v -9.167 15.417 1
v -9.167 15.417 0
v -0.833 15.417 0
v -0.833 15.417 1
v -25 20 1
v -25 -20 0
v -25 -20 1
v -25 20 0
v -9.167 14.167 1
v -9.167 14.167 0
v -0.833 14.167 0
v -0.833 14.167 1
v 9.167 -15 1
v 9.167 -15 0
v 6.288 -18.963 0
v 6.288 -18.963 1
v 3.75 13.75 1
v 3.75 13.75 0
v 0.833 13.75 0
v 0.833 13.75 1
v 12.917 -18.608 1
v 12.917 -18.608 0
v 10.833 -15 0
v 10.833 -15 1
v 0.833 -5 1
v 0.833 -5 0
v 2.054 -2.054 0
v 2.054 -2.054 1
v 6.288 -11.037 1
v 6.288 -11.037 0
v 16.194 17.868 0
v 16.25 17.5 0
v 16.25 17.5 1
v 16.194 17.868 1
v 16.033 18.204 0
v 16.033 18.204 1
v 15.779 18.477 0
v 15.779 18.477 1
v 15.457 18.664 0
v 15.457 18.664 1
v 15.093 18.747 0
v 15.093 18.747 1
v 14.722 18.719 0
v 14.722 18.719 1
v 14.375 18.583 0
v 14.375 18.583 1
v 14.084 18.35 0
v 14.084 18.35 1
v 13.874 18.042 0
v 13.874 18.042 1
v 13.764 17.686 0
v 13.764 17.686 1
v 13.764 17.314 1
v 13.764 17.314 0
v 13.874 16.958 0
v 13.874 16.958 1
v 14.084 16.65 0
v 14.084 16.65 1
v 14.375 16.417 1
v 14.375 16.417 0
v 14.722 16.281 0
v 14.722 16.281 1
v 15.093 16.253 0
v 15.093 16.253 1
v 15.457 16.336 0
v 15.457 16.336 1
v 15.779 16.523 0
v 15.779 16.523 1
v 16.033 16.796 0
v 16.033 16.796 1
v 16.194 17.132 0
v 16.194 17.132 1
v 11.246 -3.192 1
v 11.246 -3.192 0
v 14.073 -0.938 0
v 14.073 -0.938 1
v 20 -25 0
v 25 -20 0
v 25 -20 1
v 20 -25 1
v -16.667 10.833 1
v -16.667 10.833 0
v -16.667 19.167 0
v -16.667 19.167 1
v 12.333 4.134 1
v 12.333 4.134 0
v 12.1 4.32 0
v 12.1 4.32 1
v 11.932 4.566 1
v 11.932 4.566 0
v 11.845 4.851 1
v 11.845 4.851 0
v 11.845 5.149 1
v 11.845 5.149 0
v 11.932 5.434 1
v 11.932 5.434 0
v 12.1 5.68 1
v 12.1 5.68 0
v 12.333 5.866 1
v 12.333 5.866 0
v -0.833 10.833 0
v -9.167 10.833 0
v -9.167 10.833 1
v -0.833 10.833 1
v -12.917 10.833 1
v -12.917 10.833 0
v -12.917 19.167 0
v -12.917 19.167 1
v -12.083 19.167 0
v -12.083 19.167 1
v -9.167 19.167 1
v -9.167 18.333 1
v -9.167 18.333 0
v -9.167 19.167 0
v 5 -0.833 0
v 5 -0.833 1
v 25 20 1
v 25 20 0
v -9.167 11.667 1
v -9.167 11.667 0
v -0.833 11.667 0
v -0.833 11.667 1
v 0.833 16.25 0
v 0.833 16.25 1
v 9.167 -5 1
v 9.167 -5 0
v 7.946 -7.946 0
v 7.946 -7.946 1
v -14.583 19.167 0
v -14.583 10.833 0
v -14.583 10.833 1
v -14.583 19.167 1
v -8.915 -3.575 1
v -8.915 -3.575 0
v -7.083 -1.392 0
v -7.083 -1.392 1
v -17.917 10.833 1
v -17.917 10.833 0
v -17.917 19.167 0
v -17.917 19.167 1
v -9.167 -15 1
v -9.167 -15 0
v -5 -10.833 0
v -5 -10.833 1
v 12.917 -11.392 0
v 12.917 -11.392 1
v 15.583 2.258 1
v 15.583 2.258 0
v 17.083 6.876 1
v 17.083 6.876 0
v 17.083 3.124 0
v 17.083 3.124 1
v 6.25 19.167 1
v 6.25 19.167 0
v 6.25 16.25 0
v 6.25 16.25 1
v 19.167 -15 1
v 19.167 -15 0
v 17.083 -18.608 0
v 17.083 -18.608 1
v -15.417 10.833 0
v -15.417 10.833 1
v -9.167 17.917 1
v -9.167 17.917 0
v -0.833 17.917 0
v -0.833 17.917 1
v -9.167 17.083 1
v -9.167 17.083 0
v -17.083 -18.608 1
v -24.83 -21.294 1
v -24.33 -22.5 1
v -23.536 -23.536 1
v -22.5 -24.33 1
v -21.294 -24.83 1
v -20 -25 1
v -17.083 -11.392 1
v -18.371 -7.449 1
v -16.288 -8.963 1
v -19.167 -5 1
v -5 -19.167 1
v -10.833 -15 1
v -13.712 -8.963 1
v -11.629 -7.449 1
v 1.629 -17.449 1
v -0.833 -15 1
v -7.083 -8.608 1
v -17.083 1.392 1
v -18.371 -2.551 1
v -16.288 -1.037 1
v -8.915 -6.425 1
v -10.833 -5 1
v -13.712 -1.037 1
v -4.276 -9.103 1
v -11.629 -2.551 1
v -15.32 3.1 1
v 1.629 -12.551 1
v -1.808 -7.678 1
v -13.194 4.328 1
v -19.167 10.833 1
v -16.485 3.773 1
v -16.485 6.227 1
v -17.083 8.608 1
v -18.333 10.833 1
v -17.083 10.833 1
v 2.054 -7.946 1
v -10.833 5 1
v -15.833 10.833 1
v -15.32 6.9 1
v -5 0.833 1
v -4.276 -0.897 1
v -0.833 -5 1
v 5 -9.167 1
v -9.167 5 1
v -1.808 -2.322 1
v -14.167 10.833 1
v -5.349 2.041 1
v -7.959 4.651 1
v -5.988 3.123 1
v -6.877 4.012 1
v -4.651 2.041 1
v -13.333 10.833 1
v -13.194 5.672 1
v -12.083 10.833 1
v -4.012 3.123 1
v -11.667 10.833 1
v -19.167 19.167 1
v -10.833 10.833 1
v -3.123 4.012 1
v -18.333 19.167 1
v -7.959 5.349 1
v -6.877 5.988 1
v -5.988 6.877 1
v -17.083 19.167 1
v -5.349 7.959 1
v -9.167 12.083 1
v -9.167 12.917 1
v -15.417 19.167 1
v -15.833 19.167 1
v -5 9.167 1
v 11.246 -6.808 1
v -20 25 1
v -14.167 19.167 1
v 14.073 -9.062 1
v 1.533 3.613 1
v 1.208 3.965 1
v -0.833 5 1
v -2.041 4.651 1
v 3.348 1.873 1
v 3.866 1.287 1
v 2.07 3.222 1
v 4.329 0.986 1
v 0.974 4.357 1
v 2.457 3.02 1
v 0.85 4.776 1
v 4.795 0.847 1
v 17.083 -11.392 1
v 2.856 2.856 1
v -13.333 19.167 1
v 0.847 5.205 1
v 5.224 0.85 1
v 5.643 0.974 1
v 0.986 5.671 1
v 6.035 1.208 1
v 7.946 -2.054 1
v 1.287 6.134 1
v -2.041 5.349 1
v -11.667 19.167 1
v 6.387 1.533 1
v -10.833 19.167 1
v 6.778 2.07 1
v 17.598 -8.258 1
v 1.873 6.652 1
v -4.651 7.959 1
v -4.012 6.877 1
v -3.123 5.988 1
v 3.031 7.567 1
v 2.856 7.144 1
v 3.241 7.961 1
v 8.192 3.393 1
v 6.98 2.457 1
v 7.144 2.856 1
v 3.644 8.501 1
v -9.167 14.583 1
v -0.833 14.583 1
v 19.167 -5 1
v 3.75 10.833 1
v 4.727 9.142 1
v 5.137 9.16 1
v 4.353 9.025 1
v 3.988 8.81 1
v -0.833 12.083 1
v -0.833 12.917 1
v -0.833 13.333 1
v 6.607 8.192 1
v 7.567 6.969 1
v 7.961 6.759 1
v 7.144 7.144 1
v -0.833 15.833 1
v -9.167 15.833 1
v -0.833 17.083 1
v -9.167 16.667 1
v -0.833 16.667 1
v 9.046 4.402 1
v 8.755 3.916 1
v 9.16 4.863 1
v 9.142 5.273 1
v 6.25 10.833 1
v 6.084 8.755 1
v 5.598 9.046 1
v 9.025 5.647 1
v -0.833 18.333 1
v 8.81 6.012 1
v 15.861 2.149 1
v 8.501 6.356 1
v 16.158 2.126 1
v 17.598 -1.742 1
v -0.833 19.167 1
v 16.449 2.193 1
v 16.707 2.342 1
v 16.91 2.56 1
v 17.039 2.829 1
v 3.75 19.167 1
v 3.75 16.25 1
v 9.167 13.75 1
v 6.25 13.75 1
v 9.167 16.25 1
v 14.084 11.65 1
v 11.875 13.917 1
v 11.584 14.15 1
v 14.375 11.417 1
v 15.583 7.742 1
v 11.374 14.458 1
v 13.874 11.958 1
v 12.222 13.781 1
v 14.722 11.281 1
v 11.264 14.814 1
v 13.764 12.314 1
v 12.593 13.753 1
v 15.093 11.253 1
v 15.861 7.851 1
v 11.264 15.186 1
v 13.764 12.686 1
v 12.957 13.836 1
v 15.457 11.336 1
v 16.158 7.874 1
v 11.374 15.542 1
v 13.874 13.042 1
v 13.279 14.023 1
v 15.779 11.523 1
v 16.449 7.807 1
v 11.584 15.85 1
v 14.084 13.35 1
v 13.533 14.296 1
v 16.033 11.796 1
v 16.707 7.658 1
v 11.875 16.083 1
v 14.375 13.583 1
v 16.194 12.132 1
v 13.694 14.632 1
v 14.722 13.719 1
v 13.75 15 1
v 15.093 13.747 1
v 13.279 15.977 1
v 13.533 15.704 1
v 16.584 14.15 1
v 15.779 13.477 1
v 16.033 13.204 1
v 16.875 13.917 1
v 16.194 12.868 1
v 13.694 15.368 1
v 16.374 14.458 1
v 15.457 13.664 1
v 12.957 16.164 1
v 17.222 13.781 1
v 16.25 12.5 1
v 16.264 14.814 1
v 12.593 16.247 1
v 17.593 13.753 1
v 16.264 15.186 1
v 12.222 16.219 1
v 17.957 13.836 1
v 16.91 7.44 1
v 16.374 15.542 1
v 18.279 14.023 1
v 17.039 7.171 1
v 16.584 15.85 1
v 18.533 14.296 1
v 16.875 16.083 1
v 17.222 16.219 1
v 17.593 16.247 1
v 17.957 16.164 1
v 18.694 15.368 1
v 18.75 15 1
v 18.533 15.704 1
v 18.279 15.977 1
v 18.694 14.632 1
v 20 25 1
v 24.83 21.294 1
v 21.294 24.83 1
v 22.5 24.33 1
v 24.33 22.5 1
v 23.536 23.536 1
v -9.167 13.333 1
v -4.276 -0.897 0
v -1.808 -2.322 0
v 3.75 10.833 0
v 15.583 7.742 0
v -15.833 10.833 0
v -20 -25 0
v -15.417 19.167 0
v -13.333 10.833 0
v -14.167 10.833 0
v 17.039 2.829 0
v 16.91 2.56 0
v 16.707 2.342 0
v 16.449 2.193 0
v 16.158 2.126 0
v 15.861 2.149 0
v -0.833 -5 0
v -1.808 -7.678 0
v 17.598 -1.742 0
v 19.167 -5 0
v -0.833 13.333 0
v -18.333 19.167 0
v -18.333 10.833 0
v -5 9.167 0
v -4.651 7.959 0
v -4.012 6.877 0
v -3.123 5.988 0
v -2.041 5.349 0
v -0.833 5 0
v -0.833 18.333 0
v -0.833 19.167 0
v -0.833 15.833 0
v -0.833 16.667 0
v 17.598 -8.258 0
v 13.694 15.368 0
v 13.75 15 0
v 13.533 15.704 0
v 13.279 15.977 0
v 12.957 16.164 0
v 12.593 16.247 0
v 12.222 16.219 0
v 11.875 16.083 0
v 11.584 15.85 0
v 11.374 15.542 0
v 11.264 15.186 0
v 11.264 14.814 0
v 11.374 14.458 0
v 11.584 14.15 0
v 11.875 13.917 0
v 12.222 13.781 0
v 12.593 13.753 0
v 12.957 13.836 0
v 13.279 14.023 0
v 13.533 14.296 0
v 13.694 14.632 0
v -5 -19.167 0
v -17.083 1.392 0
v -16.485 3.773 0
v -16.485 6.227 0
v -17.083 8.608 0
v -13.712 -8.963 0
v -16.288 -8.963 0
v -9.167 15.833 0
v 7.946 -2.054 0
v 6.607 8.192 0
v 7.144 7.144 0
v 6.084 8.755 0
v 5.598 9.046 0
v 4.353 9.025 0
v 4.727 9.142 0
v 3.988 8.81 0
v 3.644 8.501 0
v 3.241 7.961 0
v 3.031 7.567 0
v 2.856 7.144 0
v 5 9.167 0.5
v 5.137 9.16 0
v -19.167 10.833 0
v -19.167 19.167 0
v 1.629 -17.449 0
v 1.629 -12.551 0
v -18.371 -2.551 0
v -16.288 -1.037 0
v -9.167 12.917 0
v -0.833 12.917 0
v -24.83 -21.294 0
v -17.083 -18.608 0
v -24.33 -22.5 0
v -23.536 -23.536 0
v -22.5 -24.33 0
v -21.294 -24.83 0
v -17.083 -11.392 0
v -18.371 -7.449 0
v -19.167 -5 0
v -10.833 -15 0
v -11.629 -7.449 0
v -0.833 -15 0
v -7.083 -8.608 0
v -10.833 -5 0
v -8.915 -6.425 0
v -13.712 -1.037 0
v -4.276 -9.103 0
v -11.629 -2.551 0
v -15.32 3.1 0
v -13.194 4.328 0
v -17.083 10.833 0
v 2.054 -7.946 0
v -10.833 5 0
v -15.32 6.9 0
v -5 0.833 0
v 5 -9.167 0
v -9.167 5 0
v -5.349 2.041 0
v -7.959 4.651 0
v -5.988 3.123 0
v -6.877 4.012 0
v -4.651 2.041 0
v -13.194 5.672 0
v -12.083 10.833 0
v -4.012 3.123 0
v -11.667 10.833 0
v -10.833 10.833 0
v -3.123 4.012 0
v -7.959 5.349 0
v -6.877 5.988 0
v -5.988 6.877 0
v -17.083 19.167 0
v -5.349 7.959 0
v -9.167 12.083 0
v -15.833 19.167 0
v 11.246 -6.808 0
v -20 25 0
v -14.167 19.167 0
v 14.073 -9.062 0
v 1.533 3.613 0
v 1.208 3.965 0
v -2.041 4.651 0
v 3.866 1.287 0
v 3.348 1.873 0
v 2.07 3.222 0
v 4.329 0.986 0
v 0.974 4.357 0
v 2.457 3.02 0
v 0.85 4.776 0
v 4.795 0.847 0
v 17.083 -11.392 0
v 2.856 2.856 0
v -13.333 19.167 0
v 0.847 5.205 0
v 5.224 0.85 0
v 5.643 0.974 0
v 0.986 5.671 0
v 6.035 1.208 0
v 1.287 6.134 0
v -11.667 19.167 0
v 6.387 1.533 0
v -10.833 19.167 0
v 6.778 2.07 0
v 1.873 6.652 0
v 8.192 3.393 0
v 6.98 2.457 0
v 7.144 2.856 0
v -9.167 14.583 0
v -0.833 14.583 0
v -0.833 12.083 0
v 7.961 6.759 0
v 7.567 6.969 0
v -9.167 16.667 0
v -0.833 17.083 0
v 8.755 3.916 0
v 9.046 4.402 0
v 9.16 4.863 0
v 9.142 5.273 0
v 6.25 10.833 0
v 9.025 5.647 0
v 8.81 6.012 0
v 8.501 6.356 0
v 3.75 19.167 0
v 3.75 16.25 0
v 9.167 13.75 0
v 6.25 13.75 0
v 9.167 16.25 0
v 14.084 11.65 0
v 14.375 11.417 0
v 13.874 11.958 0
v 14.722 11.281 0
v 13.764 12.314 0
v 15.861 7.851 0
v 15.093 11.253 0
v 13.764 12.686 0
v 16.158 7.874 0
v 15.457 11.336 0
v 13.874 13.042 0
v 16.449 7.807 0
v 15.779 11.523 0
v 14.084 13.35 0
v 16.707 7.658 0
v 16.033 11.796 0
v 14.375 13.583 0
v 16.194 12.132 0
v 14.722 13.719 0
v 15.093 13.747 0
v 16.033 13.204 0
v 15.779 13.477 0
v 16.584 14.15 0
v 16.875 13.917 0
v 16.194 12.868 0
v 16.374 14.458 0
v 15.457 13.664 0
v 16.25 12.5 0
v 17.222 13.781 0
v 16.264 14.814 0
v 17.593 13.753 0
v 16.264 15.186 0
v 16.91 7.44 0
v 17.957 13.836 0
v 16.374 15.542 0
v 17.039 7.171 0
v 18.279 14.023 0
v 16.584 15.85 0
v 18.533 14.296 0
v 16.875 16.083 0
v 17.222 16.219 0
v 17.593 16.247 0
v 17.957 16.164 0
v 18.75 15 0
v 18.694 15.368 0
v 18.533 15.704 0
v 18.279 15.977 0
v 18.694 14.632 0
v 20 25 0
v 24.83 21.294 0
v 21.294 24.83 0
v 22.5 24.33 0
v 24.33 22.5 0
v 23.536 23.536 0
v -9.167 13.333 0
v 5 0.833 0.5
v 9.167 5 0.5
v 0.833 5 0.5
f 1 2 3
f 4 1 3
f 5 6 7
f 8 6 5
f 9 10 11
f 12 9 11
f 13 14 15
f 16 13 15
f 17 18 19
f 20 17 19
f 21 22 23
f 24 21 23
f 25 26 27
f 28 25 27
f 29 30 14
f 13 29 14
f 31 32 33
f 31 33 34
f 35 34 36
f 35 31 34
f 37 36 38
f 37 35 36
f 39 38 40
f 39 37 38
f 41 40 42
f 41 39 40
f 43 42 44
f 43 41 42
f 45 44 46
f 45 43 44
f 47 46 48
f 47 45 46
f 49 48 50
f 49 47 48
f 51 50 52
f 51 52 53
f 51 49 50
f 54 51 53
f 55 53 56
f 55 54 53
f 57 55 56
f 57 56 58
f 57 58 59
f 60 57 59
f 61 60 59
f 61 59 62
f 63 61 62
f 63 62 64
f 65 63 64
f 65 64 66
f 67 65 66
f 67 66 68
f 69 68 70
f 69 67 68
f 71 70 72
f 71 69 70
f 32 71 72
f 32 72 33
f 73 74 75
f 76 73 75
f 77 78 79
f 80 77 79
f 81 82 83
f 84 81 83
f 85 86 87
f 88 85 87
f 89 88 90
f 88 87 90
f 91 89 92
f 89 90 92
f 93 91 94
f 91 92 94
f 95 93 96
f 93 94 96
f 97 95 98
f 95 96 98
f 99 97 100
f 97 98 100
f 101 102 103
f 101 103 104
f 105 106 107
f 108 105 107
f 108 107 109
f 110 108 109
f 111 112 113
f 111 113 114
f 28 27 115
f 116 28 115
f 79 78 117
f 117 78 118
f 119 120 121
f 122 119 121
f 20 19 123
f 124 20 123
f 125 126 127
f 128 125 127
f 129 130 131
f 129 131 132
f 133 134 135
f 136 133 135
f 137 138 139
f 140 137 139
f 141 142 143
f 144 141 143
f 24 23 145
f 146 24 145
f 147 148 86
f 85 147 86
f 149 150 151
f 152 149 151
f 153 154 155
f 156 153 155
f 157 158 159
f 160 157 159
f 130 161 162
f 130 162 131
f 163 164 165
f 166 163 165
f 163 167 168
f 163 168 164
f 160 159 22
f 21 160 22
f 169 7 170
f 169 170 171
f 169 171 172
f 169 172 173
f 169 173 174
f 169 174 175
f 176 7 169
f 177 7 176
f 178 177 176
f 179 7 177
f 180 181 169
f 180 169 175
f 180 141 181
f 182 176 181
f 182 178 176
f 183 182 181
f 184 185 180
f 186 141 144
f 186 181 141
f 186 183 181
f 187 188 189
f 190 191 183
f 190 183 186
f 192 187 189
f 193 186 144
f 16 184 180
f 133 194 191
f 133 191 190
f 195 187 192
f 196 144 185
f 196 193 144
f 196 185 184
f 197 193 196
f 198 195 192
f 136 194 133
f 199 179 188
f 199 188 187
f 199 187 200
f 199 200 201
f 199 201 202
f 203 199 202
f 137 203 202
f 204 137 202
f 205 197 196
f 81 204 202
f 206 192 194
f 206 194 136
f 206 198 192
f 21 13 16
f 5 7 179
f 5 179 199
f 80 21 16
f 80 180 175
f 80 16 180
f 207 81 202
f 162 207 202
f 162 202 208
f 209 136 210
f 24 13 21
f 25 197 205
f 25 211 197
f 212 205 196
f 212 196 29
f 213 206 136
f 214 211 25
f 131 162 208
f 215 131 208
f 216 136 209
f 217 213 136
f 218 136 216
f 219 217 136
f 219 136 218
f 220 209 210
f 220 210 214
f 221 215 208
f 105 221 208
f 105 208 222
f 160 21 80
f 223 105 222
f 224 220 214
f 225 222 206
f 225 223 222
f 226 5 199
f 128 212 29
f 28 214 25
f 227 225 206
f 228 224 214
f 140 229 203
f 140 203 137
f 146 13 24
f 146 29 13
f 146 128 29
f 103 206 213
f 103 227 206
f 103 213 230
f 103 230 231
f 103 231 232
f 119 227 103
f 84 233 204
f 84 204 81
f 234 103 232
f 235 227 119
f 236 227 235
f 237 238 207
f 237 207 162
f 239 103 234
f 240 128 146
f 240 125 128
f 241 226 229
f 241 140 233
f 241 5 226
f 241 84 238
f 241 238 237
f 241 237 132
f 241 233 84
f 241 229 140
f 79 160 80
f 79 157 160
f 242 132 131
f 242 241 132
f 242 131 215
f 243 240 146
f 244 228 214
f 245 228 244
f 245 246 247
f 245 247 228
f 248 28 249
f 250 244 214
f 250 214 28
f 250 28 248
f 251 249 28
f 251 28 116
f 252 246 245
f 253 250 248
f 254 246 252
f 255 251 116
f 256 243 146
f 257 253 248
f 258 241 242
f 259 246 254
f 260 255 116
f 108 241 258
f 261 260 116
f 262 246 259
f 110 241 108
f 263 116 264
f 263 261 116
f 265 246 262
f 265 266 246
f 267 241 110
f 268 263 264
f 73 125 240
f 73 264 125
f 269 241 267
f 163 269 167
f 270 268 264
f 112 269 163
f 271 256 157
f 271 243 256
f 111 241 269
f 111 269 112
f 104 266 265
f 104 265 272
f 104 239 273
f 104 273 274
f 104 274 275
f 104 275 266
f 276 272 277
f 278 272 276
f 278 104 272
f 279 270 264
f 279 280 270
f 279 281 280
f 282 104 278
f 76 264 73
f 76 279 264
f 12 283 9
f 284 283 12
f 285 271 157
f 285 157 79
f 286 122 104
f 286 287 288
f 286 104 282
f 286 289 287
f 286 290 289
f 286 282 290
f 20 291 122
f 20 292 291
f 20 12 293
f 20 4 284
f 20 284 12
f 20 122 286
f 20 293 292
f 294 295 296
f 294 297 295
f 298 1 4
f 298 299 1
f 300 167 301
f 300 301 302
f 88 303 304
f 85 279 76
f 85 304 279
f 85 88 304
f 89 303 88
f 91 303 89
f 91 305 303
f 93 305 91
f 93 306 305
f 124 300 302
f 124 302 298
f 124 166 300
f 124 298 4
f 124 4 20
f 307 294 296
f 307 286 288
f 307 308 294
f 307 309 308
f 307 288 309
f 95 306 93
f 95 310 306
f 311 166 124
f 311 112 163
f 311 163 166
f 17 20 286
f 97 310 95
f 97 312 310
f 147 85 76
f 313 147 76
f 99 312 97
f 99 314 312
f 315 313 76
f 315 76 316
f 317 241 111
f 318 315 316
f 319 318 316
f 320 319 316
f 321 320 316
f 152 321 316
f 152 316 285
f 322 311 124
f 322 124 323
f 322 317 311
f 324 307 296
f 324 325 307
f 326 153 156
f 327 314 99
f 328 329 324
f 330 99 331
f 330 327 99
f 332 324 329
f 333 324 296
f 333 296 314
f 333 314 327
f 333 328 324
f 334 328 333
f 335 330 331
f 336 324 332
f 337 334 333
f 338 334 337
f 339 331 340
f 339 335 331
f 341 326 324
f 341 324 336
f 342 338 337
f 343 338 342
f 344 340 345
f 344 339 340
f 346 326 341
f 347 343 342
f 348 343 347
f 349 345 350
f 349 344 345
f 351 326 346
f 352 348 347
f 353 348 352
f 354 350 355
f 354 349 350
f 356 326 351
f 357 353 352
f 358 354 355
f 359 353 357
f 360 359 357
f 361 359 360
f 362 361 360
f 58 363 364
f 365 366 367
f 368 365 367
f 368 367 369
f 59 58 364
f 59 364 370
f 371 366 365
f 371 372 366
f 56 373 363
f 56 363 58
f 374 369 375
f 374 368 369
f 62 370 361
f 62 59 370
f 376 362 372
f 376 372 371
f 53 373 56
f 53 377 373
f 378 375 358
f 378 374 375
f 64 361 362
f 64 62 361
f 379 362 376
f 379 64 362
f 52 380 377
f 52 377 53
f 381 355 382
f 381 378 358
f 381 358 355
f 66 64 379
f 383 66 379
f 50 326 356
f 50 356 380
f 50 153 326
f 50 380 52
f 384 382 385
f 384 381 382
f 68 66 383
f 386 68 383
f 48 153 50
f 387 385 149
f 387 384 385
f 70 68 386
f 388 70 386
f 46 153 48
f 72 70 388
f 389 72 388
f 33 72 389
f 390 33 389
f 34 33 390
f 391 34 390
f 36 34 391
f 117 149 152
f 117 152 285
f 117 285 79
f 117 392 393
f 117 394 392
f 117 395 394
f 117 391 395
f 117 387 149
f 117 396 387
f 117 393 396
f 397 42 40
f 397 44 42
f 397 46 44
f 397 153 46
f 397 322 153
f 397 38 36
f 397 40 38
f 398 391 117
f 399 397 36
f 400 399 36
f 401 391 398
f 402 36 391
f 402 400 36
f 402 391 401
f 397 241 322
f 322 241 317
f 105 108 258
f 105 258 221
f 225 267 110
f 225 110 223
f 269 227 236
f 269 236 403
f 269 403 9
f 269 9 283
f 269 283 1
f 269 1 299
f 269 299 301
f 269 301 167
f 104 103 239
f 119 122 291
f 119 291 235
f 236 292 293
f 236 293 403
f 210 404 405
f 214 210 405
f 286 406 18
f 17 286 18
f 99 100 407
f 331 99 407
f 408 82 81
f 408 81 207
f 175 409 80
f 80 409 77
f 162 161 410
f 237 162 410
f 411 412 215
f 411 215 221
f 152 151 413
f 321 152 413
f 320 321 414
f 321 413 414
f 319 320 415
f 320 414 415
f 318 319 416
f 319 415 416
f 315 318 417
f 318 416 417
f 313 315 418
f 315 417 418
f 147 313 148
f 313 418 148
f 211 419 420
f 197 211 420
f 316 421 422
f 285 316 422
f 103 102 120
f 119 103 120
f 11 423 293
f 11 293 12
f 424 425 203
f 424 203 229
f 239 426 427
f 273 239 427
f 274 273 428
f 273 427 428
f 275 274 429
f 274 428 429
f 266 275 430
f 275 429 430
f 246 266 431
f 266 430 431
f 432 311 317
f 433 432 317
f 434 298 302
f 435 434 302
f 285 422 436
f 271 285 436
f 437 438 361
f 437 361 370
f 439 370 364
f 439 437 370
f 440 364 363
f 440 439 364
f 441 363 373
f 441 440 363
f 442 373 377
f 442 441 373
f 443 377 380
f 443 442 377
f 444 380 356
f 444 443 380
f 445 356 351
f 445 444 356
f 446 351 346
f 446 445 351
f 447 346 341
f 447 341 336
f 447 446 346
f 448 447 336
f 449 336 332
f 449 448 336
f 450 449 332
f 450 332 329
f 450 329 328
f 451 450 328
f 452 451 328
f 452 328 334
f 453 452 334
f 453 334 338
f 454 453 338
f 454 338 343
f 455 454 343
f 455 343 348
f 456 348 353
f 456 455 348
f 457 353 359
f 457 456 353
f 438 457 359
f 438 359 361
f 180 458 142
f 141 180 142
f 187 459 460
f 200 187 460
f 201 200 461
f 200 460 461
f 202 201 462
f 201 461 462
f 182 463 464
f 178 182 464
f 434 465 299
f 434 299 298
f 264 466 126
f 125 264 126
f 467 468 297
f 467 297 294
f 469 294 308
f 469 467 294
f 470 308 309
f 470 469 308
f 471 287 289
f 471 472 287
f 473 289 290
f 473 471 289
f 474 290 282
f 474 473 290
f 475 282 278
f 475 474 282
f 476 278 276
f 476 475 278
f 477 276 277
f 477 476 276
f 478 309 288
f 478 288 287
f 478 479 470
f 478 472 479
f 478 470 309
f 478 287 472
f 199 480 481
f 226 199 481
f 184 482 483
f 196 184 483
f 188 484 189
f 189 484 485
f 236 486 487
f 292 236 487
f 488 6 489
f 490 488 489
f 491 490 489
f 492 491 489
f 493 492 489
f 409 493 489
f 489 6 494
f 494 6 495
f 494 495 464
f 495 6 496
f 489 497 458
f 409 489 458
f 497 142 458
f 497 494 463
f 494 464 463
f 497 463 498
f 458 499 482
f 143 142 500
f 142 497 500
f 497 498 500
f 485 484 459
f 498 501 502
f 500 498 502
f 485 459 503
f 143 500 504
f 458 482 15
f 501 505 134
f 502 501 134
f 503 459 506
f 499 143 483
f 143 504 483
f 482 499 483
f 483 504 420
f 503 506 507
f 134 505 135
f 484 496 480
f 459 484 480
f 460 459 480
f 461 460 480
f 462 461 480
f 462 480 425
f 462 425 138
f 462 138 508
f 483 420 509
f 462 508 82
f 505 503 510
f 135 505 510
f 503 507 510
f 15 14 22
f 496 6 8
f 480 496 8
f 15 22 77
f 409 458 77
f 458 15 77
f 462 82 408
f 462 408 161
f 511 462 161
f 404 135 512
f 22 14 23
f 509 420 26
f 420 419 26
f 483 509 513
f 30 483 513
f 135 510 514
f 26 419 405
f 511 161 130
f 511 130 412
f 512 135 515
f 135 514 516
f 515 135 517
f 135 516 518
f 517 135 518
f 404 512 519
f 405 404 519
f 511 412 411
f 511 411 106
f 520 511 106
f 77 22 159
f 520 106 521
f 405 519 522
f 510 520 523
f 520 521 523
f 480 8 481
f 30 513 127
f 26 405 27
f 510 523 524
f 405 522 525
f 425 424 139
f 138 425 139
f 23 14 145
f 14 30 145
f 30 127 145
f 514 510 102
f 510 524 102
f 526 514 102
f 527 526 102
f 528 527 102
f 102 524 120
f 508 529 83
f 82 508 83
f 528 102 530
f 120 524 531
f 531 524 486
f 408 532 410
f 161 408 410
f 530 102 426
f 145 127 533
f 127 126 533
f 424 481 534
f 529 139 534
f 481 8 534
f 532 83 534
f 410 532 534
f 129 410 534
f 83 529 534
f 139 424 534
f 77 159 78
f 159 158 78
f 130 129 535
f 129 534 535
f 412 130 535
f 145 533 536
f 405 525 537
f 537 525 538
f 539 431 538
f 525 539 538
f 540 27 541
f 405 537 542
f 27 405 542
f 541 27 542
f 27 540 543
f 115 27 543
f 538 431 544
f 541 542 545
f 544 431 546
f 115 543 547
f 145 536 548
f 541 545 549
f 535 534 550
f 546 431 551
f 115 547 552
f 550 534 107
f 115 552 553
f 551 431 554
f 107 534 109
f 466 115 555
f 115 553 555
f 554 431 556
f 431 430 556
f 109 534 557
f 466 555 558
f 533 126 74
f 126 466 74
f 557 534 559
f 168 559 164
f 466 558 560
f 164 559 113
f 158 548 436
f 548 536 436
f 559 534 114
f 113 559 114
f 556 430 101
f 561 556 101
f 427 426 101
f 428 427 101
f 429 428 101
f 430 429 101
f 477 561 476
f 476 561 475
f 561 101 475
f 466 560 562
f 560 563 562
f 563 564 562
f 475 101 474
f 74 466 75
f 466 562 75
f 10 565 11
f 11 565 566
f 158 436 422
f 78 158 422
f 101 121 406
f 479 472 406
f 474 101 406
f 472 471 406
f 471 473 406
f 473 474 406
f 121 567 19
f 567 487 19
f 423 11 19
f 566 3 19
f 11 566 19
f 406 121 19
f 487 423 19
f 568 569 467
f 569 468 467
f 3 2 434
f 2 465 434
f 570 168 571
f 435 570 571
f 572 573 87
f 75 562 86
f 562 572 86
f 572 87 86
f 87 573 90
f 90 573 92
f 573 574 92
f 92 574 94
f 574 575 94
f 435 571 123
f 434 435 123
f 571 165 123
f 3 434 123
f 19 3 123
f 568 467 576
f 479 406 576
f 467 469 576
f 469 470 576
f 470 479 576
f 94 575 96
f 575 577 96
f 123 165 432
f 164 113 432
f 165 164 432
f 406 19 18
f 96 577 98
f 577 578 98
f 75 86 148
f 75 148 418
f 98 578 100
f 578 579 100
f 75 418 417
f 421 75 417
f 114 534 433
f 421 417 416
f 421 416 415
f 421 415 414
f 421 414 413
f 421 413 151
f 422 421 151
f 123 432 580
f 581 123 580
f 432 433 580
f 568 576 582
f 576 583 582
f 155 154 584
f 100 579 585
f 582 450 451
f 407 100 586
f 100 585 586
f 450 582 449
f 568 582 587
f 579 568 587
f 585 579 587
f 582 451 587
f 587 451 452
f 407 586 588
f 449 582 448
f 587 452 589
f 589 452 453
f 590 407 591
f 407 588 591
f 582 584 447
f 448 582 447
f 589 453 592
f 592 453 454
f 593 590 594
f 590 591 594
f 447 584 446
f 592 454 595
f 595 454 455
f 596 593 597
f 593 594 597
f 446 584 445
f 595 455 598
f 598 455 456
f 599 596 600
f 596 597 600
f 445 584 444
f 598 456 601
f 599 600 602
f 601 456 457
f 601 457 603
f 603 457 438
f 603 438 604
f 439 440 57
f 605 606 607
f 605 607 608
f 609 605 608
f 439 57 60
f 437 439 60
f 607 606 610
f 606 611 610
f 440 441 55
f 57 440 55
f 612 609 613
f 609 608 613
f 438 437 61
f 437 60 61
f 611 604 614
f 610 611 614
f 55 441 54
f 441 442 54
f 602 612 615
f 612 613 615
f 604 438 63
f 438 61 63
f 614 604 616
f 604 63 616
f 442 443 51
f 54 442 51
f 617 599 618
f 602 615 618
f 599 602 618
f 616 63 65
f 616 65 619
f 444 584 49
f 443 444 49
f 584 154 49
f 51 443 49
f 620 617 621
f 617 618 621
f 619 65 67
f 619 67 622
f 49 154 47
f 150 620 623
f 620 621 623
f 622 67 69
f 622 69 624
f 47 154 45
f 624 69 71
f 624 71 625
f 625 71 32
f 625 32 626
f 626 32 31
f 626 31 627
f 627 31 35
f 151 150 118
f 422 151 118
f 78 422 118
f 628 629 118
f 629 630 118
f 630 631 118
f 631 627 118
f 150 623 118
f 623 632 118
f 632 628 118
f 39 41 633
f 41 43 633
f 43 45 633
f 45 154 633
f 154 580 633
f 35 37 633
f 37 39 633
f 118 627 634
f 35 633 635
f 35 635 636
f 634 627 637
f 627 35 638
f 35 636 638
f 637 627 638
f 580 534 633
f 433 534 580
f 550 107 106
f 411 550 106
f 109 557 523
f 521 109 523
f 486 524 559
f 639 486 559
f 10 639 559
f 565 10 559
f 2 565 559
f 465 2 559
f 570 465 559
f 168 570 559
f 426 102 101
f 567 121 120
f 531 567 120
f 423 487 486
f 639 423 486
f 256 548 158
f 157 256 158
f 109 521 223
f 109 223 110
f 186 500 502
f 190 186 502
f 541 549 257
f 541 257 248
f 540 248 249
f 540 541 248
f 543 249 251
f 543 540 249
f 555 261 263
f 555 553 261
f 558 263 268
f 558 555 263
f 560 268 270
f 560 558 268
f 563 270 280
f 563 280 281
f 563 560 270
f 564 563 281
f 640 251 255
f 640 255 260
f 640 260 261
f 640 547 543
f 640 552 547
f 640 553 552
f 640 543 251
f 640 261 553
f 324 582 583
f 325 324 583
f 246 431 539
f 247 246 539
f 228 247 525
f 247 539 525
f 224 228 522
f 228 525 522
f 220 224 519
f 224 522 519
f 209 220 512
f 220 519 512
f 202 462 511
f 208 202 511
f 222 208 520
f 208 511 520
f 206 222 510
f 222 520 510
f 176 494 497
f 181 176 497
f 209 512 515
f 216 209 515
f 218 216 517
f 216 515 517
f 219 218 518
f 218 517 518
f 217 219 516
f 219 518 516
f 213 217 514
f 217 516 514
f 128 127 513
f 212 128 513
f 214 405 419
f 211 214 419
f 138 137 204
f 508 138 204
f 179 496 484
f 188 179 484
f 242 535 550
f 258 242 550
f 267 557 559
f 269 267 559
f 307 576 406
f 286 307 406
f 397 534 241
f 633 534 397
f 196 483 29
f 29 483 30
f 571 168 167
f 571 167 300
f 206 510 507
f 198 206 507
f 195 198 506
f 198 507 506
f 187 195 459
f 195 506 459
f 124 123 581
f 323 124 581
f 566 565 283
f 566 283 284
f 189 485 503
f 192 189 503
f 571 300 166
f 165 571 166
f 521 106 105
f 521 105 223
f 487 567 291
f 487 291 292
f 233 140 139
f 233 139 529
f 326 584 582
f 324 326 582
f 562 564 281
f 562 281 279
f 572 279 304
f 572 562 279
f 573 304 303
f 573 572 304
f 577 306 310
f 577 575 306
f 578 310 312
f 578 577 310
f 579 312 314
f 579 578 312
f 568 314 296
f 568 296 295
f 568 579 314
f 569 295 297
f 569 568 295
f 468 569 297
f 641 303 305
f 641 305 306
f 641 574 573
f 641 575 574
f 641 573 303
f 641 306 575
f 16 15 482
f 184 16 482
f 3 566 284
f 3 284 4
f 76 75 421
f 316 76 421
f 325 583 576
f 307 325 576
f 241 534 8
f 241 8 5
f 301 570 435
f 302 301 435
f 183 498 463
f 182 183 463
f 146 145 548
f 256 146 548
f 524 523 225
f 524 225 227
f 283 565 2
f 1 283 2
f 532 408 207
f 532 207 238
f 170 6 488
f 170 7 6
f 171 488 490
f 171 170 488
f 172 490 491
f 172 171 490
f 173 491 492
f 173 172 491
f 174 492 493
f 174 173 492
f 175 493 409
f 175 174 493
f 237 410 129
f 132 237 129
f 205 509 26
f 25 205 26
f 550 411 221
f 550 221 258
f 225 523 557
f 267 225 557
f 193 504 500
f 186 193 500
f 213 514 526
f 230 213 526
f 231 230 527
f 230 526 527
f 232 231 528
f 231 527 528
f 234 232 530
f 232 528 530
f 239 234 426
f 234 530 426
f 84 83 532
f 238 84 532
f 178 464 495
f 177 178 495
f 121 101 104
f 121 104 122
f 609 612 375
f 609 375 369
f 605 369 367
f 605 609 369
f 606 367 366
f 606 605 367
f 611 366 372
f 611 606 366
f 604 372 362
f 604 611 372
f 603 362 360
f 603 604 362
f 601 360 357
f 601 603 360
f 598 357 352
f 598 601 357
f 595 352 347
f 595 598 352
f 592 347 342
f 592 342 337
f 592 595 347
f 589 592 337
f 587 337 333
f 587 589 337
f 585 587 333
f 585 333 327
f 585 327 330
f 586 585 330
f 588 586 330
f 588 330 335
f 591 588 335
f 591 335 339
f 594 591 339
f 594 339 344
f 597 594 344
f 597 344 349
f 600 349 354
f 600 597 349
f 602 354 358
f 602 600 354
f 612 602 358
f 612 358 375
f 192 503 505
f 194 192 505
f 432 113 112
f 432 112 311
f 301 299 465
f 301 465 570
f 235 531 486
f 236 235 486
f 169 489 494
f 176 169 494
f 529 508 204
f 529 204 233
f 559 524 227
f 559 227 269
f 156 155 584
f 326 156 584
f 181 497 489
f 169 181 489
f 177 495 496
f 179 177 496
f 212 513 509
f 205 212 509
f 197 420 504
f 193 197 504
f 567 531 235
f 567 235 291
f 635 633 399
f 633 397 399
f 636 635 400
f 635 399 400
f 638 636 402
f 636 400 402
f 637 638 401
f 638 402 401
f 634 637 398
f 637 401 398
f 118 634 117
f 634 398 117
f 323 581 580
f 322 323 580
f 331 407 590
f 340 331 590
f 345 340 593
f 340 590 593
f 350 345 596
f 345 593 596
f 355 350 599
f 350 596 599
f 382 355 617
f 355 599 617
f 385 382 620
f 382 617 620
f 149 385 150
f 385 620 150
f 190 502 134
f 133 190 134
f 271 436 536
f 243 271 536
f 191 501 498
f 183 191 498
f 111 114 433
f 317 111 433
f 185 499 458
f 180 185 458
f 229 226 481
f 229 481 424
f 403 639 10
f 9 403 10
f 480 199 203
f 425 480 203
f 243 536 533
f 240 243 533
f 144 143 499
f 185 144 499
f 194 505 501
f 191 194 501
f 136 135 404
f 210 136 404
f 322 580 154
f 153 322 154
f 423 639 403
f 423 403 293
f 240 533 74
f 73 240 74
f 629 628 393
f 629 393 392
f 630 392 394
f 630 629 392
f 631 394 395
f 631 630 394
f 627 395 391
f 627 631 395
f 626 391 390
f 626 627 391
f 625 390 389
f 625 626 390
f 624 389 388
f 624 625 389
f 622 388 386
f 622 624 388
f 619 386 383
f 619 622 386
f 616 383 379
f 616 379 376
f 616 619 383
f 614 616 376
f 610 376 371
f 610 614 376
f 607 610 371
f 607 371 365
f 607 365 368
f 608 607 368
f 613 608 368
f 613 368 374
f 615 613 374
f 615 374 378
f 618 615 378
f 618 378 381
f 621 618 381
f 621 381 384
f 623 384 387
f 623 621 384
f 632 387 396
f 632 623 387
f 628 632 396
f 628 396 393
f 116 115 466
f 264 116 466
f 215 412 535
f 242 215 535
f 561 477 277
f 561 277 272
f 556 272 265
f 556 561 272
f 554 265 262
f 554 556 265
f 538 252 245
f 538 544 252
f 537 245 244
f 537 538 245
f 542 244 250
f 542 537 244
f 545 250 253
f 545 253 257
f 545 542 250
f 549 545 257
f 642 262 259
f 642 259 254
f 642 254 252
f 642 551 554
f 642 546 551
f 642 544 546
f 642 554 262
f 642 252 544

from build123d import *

# Parameters (mm, degrees)
F1_W     = 50
F1_H     = 50
F1_W_2   = 8.3333333333
F1_H_2   = 0.8333333333
F1_W_3   = 0.8333333333
F1_H_3   = 8.3333333333
F1_R     = 1.25
F2_DEPTH = 1
F3_R     = 5
F4_SIZE  = 5


with BuildPart() as f2:
    # F1 (on Top) → F2 (new body)
    with BuildSketch(Plane.XY):
        Rectangle(F1_W, F1_H)
        Polygon((-17.0833333333, -11.3915608176), (-10.8333333333, -15), (-17.0833333333, -18.6084391824), align=None, mode=Mode.SUBTRACT)
        Polygon((-5, -10.8333333333), (-0.8333333333, -15), (-5, -19.1666666667), (-9.1666666667, -15), align=None, mode=Mode.SUBTRACT)
        Polygon((-11.6290958568, -2.5508947821), (-10.8333333333, -5), (-11.6290958568, -7.4491052179), (-13.7124291901, -8.9627354846), (-16.2875708099, -8.9627354846), (-18.3709041432, -7.4491052179), (-19.1666666667, -5), (-18.3709041432, -2.5508947821), (-16.2875708099, -1.0372645154), (-13.7124291901, -1.0372645154), align=None, mode=Mode.SUBTRACT)
        Polygon((-1.8081481537, -2.321718293), (-0.8333333333, -5), (-1.8081481537, -7.678281707), (-4.2764659264, -9.1033656376), (-7.0833333333, -8.6084391824), (-8.9153859199, -6.4250839305), (-8.9153859199, -3.5749160695), (-7.0833333333, -1.3915608176), (-4.2764659264, -0.8966343624), align=None, mode=Mode.SUBTRACT)
        Polygon((6.2875708099, -11.0372645154), (9.1666666667, -15), (6.2875708099, -18.9627354846), (1.6290958568, -17.4491052179), (1.6290958568, -12.5508947821), align=None, mode=Mode.SUBTRACT)
        Polygon((17.0833333333, -11.3915608176), (19.1666666667, -15), (17.0833333333, -18.6084391824), (12.9166666667, -18.6084391824), (10.8333333333, -15), (12.9166666667, -11.3915608176), align=None, mode=Mode.SUBTRACT)
        Polygon((7.9462782549, -2.0537217451), (9.1666666667, -5), (7.9462782549, -7.9462782549), (5, -9.1666666667), (2.0537217451, -7.9462782549), (0.8333333333, -5), (2.0537217451, -2.0537217451), (5, -0.8333333333), align=None, mode=Mode.SUBTRACT)
        Polygon((17.5978741744, -1.742368823), (19.1666666667, -5), (17.5978741744, -8.257631177), (14.0728294418, -9.0621996341), (11.2459630504, -6.807848913), (11.2459630504, -3.192151087), (14.0728294418, -0.9378003659), align=None, mode=Mode.SUBTRACT)
        with BuildLine():
            ThreePointArc((-10.8333333333, 5), (-14.2952022322, 3.7792544571), (-17.0833333333, 1.3915608176))
            ThreePointArc((-17.0833333333, 1.3915608176), (-16.4095955357, 5), (-17.0833333333, 8.6084391824))
            ThreePointArc((-17.0833333333, 8.6084391824), (-14.2952022322, 6.2207455429), (-10.8333333333, 5))
        make_face(mode=Mode.SUBTRACT)
        with BuildLine():
            ThreePointArc((-5, 0.8333333333), (-6.4043221776, 3.5956778224), (-9.1666666667, 5))
            ThreePointArc((-9.1666666667, 5), (-6.4043221776, 6.4043221776), (-5, 9.1666666667))
            ThreePointArc((-5, 9.1666666667), (-3.5956778224, 6.4043221776), (-0.8333333333, 5))
            ThreePointArc((-0.8333333333, 5), (-3.5956778224, 3.5956778224), (-5, 0.8333333333))
        make_face(mode=Mode.SUBTRACT)
        with Locations((-5, 11.25)):
            Rectangle(F1_W_2, F1_H_2, mode=Mode.SUBTRACT)
        with Locations((-18.75, 15)):
            Rectangle(F1_W_3, F1_H_3, mode=Mode.SUBTRACT)
        with Locations((-17.5, 15)):
            Rectangle(F1_W_3, F1_H_3, mode=Mode.SUBTRACT)
        with Locations((-16.25, 15)):
            Rectangle(F1_W_3, F1_H_3, mode=Mode.SUBTRACT)
        with Locations((-15, 15)):
            Rectangle(F1_W_3, F1_H_3, mode=Mode.SUBTRACT)
        with Locations((-13.75, 15)):
            Rectangle(F1_W_3, F1_H_3, mode=Mode.SUBTRACT)
        with Locations((-12.5, 15)):
            Rectangle(F1_W_3, F1_H_3, mode=Mode.SUBTRACT)
        with Locations((-11.25, 15)):
            Rectangle(F1_W_3, F1_H_3, mode=Mode.SUBTRACT)
        with Locations((-5, 12.5)):
            Rectangle(F1_W_2, F1_H_2, mode=Mode.SUBTRACT)
        with Locations((-5, 13.75)):
            Rectangle(F1_W_2, F1_H_2, mode=Mode.SUBTRACT)
        with Locations((-5, 15)):
            Rectangle(F1_W_2, F1_H_2, mode=Mode.SUBTRACT)
        with Locations((-5, 16.25)):
            Rectangle(F1_W_2, F1_H_2, mode=Mode.SUBTRACT)
        with Locations((-5, 17.5)):
            Rectangle(F1_W_2, F1_H_2, mode=Mode.SUBTRACT)
        with Locations((-5, 18.75)):
            Rectangle(F1_W_2, F1_H_2, mode=Mode.SUBTRACT)
        with BuildLine():
            add(Edge.make_bspline(
                [(5, 9.1666666667), (3.5845240526, 9.1666666667), (2.8562676857, 7.1437323143)],
                knots=[0, 0, 0, 1.0303768265, 1.0303768265, 1.0303768265], degree=2, weights=[1, 0.8701999068, 1]))
            add(Edge.make_bspline(
                [(7.1437323143, 7.1437323143), (6.4154759474, 9.1666666667), (5, 9.1666666667)],
                knots=[5.2528084807, 5.2528084807, 5.2528084807, 6.2831853072, 6.2831853072, 6.2831853072], degree=2, weights=[1, 0.8701999068, 1]))
            add(Edge.make_bspline(
                [(9.1666666667, 5), (9.1666666667, 6.4154759474), (7.1437323143, 7.1437323143)],
                knots=[0, 0, 0, 1.0303768265, 1.0303768265, 1.0303768265], degree=2, weights=[1, 0.8701999068, 1]))
            add(Edge.make_bspline(
                [(7.1437323143, 2.8562676857), (9.1666666667, 3.5845240526), (9.1666666667, 5)],
                knots=[5.2528084807, 5.2528084807, 5.2528084807, 6.2831853072, 6.2831853072, 6.2831853072], degree=2, weights=[1, 0.8701999068, 1]))
            add(Edge.make_bspline(
                [(2.8562676857, 2.8562676857), (5, -3.0985442984), (7.1437323143, 2.8562676857)],
                knots=[2.1112158271, 2.1112158271, 2.1112158271, 4.1719694801, 4.1719694801, 4.1719694801], degree=2, weights=[1, 0.5144957554, 1]))
            add(Edge.make_bspline(
                [(2.8562676857, 7.1437323143), (-3.0985442984, 5), (2.8562676857, 2.8562676857)],
                knots=[2.1112158271, 2.1112158271, 2.1112158271, 4.1719694801, 4.1719694801, 4.1719694801], degree=2, weights=[1, 0.5144957554, 1]))
        make_face(mode=Mode.SUBTRACT)
        with BuildLine():
            ThreePointArc((12.3333333333, 4.1339745962), (11.8333333333, 5), (12.3333333333, 5.8660254038))
            Line((12.3333333333, 5.8660254038), (15.5833333333, 7.7424137787))
            ThreePointArc((15.5833333333, 7.7424137787), (16.5833333333, 7.7424137787), (17.0833333333, 6.8763883749))
            Line((17.0833333333, 6.8763883749), (17.0833333333, 3.1236116251))
            ThreePointArc((17.0833333333, 3.1236116251), (16.5833333333, 2.2575862213), (15.5833333333, 2.2575862213))
            Line((15.5833333333, 2.2575862213), (12.3333333333, 4.1339745962))
        make_face(mode=Mode.SUBTRACT)
        Polygon((3.75, 16.25), (3.75, 19.1666666667), (6.25, 19.1666666667), (6.25, 16.25), (9.1666666667, 16.25), (9.1666666667, 13.75), (6.25, 13.75), (6.25, 10.8333333333), (3.75, 10.8333333333), (3.75, 13.75), (0.8333333333, 13.75), (0.8333333333, 16.25), align=None, mode=Mode.SUBTRACT)
        with Locations((15, 12.5)):
            Circle(F1_R, mode=Mode.SUBTRACT)
        with Locations((12.5, 15)):
            Circle(F1_R, mode=Mode.SUBTRACT)
        with Locations((17.5, 15)):
            Circle(F1_R, mode=Mode.SUBTRACT)
        with Locations((15, 17.5)):
            Circle(F1_R, mode=Mode.SUBTRACT)
    extrude(amount=F2_DEPTH)

    # F3
    f3_edges = [f2.edges().sort_by_distance(p)[0] for p in [
        (-25, -25, 0.5),
        (25, 25, 0.5),
    ]]
    fillet(f3_edges, radius=F3_R)

    # F4
    f4_edges = [f2.edges().sort_by_distance(p)[0] for p in [
        (25, -25, 0.5),
        (-25, 25, 0.5),
    ]]
    chamfer(f4_edges, length=F4_SIZE)


solid = f2.part
